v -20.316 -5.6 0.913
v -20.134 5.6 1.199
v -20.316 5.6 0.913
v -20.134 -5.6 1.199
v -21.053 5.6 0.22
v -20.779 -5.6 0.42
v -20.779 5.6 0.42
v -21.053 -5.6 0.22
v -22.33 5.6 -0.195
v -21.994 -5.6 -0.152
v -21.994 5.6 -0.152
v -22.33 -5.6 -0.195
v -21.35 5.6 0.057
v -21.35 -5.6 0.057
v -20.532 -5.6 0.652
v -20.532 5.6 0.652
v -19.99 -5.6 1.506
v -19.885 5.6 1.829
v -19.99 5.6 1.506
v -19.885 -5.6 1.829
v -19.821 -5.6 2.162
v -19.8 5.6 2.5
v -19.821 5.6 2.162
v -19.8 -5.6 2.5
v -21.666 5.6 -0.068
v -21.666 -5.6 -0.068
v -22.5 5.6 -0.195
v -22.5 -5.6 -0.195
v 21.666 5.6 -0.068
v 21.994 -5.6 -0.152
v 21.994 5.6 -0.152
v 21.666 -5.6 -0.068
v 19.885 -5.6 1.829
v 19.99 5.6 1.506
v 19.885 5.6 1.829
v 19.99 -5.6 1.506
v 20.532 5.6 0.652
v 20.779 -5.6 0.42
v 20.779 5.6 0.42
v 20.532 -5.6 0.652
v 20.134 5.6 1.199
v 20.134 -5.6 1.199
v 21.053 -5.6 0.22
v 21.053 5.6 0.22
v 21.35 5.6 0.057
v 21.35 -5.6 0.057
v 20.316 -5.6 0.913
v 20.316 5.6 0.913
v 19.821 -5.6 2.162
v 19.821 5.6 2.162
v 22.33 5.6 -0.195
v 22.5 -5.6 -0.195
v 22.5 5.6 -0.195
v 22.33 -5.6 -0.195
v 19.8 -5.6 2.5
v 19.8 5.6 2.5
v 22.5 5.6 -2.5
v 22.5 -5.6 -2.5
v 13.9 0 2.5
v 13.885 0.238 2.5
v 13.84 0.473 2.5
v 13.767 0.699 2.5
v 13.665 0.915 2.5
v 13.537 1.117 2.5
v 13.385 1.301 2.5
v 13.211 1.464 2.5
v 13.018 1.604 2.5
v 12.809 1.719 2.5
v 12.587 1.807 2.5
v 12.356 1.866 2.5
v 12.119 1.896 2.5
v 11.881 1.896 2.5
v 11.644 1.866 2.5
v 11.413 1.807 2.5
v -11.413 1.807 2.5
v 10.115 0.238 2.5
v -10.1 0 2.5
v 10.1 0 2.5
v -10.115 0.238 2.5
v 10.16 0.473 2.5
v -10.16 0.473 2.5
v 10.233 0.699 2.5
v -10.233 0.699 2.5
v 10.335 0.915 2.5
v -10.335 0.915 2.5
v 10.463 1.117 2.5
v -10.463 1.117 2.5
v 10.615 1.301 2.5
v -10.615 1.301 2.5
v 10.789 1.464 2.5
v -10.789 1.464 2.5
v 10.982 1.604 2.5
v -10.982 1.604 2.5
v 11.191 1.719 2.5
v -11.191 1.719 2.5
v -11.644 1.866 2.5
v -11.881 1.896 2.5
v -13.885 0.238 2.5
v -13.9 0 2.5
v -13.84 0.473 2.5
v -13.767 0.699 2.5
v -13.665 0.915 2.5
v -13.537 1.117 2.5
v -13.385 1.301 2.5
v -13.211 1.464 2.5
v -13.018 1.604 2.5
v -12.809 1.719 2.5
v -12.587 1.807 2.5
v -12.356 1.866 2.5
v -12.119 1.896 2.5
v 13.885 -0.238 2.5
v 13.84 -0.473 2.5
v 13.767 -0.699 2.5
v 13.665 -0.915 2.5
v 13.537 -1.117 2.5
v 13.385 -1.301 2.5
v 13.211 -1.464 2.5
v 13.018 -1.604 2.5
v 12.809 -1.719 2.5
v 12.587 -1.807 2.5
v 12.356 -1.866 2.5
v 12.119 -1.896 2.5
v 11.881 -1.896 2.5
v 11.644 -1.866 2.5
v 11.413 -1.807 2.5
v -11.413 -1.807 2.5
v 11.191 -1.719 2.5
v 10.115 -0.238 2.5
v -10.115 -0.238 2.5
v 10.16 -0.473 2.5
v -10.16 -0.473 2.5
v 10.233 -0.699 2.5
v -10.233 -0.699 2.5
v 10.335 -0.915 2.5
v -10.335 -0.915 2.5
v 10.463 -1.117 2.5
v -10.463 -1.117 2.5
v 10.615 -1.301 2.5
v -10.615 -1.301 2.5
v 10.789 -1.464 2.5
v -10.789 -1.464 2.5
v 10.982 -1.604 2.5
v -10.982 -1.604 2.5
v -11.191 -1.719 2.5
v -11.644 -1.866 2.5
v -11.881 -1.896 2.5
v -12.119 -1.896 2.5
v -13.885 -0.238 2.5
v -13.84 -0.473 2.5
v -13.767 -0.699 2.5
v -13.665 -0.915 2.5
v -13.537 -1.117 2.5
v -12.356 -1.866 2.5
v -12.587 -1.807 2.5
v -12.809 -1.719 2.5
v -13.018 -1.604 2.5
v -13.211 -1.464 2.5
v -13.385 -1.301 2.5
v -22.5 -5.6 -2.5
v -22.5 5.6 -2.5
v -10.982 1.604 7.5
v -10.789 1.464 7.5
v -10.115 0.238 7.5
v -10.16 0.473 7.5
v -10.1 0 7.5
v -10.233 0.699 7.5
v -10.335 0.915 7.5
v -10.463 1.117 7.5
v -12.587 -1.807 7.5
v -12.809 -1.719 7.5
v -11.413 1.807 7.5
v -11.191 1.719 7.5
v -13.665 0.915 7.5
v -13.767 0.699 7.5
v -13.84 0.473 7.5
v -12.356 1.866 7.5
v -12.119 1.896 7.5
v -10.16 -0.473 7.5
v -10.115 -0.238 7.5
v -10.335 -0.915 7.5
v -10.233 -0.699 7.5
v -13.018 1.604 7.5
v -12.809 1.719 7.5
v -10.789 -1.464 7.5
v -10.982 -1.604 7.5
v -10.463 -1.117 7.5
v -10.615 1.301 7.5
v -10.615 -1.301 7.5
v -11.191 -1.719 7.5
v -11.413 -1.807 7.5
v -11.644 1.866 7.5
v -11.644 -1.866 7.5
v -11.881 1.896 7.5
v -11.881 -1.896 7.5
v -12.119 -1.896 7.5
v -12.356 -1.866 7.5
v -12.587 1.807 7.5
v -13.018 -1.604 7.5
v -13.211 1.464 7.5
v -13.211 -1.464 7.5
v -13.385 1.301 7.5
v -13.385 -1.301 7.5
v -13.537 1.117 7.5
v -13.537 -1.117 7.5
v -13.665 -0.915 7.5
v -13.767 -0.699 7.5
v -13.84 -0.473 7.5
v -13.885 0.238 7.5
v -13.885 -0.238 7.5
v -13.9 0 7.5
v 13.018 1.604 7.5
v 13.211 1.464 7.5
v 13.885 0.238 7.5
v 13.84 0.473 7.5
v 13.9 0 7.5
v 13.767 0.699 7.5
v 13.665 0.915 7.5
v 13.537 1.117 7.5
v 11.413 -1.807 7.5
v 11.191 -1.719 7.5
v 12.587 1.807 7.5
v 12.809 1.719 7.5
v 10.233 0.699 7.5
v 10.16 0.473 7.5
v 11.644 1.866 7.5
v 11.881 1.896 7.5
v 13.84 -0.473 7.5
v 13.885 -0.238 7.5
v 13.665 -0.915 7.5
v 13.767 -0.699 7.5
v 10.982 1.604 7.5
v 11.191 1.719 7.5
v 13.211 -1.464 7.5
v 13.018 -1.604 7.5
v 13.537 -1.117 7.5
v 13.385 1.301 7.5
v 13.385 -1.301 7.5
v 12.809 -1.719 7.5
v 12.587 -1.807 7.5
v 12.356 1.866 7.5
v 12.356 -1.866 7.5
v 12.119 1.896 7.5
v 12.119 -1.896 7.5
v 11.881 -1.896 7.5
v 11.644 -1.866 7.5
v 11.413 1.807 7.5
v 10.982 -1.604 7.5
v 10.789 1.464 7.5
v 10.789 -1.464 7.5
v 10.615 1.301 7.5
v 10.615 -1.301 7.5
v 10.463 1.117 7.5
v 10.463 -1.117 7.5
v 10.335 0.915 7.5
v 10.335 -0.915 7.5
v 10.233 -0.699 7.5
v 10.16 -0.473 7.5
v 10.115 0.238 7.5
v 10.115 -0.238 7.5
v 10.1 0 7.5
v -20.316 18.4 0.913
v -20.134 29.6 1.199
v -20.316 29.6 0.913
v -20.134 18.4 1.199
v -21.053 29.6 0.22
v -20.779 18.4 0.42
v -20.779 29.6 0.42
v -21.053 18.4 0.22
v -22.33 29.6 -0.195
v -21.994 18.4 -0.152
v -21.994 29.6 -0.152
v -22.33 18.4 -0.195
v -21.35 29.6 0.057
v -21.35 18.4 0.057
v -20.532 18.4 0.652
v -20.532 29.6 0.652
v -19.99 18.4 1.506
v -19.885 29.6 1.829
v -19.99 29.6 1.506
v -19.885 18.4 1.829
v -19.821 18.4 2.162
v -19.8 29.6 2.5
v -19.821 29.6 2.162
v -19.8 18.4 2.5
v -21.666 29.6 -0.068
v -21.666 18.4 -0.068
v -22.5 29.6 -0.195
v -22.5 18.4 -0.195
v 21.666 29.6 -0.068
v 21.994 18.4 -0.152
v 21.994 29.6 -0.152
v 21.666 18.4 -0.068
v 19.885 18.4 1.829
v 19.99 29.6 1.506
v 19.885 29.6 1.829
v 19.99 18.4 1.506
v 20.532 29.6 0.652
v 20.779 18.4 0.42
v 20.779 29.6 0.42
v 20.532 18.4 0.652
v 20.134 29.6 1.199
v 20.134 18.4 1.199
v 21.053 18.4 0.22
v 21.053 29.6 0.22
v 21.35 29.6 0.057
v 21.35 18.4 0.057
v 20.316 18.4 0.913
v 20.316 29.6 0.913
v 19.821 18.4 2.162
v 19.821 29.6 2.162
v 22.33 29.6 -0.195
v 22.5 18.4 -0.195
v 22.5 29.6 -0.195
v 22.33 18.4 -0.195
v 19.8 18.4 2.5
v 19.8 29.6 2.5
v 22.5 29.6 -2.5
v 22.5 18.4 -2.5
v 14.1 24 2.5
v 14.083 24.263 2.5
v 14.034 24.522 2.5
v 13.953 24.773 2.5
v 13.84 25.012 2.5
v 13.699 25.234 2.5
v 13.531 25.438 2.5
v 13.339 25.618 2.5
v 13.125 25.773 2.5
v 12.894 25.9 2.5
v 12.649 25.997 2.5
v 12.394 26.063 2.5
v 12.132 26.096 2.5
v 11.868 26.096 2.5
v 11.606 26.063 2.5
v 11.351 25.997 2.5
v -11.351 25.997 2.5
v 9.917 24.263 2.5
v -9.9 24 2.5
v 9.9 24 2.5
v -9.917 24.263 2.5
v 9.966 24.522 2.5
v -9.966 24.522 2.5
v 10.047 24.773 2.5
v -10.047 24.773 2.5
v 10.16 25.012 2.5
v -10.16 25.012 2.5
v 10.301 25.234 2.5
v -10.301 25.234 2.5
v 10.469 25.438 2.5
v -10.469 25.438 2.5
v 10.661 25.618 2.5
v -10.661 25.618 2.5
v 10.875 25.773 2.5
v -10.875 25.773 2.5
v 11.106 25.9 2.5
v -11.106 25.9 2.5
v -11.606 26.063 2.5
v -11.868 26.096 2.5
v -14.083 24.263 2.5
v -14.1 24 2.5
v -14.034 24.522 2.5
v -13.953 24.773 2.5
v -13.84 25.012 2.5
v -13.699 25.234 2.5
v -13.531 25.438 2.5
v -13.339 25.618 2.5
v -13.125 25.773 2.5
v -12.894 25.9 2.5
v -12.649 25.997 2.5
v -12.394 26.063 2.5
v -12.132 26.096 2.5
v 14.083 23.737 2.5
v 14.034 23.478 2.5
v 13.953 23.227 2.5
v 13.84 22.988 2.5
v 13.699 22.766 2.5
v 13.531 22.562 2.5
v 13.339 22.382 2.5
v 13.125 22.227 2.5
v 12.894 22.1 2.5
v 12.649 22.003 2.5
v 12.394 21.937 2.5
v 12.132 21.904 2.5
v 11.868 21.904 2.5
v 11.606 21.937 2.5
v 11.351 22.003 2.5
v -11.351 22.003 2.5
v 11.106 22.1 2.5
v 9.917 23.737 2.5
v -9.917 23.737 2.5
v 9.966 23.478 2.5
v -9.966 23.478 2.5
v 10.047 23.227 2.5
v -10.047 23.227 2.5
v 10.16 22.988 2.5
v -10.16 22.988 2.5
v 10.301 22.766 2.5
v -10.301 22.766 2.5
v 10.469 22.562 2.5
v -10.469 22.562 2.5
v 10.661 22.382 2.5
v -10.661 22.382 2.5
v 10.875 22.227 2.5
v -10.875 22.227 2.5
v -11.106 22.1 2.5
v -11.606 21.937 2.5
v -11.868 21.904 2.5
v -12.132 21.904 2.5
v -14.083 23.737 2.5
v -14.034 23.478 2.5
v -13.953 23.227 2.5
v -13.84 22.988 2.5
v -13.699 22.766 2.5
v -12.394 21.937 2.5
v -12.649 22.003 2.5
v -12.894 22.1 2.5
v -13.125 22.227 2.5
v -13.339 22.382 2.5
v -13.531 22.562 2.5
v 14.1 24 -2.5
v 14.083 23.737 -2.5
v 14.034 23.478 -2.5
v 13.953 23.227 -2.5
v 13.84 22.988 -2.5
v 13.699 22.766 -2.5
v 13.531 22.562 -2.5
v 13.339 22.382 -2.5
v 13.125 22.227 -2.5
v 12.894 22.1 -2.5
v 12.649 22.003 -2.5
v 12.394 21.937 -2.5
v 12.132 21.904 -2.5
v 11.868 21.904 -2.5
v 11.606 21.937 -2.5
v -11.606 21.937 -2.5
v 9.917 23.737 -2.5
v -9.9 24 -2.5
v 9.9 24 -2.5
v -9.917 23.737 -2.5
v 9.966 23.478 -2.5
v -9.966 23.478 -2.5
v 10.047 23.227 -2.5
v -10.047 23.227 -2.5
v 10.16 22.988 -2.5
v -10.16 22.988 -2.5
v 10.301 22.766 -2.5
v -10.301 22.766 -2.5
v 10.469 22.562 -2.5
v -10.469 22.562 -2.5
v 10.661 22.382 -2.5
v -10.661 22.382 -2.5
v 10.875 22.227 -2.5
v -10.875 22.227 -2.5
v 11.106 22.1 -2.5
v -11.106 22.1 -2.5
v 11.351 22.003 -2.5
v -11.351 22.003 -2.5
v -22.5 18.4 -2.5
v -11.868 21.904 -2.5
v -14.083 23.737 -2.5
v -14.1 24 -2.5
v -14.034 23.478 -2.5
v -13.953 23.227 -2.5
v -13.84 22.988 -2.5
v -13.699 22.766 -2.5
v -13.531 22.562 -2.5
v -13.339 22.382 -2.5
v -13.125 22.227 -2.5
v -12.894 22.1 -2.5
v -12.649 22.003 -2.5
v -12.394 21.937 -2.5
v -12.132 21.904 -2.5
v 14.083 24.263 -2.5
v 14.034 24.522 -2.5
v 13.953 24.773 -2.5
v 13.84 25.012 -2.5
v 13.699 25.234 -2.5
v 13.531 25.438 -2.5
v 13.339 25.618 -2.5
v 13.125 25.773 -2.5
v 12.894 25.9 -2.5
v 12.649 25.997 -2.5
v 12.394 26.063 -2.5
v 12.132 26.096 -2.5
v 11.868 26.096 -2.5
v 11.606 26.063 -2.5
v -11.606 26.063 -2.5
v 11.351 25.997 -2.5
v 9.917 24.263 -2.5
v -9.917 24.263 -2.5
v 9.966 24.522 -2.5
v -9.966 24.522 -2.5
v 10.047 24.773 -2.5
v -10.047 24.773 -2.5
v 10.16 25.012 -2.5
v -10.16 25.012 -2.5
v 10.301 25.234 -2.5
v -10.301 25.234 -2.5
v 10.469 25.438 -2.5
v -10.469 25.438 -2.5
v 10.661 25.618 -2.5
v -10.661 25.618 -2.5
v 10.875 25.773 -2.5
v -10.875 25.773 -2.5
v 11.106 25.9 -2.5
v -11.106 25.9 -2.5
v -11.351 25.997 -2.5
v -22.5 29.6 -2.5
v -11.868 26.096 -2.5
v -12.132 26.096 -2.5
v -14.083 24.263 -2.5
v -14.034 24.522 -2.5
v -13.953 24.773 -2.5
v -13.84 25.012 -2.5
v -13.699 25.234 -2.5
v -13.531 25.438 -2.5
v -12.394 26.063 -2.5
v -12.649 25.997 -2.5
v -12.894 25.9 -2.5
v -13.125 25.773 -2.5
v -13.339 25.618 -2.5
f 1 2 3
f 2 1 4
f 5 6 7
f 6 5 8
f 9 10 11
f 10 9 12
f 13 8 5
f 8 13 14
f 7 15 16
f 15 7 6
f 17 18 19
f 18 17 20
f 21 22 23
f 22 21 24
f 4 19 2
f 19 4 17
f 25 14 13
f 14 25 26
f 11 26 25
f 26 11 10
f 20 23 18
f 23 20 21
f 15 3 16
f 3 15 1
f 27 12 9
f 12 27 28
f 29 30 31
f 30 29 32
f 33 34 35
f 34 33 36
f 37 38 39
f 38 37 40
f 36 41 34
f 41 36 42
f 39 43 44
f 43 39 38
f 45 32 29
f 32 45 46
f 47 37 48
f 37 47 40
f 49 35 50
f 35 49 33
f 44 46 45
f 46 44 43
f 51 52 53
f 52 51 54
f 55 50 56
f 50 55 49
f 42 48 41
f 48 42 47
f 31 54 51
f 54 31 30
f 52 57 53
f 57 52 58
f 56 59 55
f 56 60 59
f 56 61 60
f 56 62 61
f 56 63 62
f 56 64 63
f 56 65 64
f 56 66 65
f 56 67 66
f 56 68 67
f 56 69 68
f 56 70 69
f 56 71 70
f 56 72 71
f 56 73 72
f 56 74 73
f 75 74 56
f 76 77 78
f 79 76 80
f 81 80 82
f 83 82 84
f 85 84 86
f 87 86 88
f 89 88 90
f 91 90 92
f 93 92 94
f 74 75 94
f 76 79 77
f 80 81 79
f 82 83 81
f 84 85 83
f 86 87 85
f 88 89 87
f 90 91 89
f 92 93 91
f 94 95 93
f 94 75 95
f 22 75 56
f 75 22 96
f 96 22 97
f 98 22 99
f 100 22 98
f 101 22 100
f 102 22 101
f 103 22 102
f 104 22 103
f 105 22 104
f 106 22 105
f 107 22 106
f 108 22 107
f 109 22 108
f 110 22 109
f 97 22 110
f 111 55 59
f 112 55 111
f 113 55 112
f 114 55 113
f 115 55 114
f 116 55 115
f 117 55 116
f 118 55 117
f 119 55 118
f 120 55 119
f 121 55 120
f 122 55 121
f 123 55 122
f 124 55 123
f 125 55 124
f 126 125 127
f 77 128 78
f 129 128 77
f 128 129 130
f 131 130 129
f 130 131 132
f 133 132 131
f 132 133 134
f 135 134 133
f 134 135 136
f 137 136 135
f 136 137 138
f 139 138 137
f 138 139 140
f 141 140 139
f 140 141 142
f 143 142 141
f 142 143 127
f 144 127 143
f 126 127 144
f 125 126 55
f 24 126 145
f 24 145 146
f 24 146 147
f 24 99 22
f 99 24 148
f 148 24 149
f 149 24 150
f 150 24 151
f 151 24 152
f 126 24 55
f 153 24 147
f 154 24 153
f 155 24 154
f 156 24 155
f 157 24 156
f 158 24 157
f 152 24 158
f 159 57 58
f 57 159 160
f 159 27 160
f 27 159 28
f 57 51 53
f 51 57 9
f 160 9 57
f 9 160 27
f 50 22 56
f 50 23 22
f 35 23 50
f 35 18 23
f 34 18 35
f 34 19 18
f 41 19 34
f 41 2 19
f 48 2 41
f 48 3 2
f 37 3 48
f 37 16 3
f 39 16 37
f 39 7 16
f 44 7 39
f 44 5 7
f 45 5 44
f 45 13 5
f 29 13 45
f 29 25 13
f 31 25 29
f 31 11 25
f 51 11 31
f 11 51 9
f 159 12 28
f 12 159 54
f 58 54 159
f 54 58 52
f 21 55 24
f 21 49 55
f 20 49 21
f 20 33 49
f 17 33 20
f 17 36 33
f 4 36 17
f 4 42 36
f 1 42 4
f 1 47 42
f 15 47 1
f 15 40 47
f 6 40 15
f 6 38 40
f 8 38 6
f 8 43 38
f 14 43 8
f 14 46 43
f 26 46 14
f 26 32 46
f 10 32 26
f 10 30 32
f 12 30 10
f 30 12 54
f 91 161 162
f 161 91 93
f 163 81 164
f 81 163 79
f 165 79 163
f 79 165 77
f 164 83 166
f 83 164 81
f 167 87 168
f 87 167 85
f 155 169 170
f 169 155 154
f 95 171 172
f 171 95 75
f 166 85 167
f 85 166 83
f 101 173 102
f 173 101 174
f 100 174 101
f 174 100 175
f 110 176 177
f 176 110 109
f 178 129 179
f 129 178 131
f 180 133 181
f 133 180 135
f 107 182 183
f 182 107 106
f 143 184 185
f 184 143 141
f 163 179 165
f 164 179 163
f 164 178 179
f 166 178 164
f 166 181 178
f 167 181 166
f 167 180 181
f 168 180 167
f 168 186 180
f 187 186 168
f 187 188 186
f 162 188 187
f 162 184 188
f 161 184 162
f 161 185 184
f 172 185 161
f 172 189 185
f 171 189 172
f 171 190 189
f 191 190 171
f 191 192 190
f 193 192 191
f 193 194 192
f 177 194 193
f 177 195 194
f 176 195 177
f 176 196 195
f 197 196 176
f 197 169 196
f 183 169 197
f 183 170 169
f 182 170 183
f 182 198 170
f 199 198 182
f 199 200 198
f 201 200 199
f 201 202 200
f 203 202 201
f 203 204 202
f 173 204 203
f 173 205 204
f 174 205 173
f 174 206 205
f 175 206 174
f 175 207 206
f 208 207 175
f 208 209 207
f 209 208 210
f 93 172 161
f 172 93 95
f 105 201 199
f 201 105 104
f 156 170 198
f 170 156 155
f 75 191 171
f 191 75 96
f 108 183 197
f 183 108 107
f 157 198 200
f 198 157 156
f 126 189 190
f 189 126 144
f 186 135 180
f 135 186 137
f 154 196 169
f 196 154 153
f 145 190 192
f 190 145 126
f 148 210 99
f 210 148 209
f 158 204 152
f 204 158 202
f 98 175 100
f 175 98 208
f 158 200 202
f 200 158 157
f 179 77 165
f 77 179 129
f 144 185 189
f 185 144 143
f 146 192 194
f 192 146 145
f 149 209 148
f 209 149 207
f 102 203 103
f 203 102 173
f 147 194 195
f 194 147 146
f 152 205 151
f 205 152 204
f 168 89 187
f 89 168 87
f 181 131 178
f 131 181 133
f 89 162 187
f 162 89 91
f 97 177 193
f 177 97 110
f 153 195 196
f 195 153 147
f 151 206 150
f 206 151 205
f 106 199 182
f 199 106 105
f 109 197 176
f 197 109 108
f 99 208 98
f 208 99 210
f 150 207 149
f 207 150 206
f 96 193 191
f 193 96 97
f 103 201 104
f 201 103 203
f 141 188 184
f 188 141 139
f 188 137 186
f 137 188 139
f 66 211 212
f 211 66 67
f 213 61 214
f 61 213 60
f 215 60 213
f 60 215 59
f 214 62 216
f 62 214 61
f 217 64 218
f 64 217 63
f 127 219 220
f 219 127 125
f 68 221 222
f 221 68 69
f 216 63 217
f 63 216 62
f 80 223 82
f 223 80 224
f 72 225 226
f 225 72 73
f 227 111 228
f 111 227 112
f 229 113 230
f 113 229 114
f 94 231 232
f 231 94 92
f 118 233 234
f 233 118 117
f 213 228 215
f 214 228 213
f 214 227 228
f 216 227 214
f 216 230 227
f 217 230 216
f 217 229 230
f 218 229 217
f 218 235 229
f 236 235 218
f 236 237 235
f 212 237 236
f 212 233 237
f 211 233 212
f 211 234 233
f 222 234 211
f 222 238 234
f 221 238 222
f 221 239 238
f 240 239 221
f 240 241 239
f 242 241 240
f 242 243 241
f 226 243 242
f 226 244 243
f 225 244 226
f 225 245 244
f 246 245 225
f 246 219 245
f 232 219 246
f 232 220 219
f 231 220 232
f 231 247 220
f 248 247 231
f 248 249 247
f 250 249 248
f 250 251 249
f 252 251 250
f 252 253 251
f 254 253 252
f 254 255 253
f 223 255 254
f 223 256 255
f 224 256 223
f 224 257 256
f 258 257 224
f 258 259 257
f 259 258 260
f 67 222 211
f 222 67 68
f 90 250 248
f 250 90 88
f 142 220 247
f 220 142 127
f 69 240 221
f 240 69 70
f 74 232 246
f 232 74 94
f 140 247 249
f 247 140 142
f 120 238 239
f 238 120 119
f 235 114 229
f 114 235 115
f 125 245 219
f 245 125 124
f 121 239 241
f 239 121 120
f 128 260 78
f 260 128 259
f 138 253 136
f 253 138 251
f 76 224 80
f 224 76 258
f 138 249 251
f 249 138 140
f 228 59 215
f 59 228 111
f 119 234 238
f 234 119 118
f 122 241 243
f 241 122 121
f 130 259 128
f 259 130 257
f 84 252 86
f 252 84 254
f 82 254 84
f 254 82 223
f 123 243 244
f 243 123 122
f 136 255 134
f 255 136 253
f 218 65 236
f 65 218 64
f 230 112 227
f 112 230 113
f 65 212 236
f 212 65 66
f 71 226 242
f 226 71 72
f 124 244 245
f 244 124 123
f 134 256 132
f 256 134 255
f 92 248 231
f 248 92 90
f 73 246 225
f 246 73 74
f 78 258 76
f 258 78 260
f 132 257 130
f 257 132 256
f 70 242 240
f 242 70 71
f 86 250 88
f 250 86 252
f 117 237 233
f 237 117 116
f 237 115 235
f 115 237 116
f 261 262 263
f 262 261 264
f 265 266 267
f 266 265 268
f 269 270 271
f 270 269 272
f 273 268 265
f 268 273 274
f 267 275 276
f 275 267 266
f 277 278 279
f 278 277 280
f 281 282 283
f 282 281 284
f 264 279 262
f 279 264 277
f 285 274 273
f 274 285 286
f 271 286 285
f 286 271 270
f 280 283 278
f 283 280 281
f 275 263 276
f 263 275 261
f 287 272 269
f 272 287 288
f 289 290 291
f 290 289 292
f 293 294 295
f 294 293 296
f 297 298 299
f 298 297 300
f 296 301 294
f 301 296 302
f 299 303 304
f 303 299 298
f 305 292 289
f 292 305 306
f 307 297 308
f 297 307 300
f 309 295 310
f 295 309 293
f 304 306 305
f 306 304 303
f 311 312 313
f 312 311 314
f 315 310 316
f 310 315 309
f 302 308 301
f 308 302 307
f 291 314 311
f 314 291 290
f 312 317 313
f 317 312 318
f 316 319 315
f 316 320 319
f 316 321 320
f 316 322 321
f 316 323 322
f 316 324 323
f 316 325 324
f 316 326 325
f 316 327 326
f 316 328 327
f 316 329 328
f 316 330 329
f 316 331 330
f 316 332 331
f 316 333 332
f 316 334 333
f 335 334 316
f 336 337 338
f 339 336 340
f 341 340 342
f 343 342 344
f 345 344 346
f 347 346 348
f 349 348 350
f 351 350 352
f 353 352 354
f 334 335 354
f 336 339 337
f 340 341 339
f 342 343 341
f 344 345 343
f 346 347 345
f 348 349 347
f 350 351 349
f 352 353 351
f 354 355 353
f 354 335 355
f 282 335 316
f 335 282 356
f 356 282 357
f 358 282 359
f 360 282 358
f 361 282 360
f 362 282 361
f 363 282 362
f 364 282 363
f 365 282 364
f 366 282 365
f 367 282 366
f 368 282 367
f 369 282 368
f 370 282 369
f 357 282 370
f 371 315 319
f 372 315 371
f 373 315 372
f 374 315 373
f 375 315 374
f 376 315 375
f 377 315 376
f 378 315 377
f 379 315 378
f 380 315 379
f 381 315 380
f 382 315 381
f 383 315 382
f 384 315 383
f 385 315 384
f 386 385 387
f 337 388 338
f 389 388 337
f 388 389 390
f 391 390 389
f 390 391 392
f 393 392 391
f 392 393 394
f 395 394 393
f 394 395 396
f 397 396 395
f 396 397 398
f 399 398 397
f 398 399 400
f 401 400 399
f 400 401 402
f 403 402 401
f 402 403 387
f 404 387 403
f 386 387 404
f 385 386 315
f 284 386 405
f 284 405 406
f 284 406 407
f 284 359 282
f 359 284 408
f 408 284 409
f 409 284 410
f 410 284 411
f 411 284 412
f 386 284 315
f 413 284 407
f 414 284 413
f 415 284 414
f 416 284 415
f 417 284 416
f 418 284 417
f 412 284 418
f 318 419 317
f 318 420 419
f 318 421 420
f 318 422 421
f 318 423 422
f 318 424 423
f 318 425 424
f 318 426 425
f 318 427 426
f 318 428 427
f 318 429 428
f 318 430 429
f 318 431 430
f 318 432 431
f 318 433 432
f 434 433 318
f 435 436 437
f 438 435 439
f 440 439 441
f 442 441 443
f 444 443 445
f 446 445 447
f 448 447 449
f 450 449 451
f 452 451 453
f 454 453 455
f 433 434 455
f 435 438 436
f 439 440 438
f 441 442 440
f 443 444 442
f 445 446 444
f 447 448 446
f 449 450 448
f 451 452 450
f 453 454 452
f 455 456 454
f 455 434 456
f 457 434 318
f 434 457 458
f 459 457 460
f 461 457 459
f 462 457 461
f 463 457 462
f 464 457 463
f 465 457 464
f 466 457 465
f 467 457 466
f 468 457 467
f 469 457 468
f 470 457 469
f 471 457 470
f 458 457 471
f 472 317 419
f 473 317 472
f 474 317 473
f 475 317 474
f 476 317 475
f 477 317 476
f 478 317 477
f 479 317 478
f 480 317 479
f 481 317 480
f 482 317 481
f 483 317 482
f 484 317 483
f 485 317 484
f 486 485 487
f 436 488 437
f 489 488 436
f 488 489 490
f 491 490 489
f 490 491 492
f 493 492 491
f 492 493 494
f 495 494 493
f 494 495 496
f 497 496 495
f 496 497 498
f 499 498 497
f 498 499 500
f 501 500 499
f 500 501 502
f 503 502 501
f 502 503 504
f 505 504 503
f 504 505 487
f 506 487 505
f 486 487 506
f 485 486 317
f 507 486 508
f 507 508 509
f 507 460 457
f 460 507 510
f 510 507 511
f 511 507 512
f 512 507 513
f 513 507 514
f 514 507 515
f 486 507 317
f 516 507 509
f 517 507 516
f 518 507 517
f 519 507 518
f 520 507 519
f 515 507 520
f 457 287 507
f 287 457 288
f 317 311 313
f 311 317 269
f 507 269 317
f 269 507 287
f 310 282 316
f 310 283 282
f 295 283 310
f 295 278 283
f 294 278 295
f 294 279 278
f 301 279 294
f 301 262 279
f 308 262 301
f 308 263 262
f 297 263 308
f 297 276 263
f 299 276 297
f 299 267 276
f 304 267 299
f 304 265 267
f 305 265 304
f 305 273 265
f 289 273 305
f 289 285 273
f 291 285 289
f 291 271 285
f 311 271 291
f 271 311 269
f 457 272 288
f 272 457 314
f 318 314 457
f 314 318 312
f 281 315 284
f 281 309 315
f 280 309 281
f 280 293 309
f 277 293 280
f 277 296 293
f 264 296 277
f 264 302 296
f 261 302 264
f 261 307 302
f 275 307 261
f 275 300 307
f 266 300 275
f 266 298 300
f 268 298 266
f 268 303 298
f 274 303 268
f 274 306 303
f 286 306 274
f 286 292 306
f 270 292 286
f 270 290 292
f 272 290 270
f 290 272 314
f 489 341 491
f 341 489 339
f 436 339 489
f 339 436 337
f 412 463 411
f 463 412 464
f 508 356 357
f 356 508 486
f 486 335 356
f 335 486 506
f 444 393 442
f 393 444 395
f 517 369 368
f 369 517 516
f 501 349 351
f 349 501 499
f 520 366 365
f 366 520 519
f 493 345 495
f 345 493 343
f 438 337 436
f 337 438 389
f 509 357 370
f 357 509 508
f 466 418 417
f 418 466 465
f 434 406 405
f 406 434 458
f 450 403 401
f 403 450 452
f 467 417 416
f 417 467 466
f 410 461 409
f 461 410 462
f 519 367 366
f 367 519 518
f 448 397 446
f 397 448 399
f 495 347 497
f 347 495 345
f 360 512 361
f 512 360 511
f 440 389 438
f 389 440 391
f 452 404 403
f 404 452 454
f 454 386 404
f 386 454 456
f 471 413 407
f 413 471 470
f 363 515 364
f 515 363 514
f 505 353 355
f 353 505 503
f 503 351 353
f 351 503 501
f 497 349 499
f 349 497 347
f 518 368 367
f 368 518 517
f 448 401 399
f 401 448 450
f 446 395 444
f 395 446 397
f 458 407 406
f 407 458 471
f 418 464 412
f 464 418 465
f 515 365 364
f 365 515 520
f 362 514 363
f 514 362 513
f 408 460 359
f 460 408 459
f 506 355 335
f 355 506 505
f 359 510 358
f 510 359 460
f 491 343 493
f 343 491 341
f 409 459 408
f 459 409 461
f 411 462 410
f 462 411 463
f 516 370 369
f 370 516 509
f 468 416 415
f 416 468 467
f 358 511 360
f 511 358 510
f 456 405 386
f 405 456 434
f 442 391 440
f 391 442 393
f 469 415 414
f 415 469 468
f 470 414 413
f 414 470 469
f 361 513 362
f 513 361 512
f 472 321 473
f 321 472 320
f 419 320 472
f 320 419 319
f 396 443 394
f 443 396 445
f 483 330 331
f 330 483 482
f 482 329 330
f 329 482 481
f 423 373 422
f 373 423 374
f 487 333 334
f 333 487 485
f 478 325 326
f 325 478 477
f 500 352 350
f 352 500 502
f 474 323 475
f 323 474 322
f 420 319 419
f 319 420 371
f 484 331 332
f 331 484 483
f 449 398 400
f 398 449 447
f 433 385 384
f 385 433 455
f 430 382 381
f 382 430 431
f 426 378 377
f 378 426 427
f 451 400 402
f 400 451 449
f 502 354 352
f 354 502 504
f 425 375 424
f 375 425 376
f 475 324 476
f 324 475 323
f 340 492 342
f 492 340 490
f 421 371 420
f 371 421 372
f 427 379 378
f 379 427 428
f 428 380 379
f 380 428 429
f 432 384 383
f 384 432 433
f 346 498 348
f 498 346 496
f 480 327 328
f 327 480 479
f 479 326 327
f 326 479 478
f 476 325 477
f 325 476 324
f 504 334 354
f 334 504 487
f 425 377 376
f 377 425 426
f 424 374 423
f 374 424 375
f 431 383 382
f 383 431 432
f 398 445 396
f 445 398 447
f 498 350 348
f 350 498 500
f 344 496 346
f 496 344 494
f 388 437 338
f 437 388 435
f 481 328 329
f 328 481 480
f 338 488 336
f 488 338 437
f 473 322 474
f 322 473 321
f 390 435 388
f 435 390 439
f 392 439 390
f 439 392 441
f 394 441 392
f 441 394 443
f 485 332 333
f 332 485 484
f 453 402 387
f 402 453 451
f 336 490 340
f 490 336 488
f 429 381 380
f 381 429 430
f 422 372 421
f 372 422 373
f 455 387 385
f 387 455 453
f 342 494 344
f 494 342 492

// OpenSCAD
// This is a strap lock for the Tom Tailor Mesenger Bag "Kentucky".
// The part will prevent the shift of the buckle and the belt and ensure that
// both pieces will always stay in the same position.
//
// Designed by Timo Heinz aka Timothy McPrint
// Date: 2017-07-27
// This work is licensed under a Creative Commons Attribution-NonCommercial-ShareAlike 4.0 International License
// (https://creativecommons.org/licenses/by-nc-sa/4.0/)


$fn=50;

buckle_inner_width=40;
buckle_inner_height=12; //including the straps!
buckle_diameter=5;
buckle_tolerance=0.1; //tolerance of the plugs and the counter parts (will influence both parts) (you need to adjust this to your printer and printer settings!)
buckle_general_tolerance=0.2; //tolerance of the outer buckle
lock_diameter=4.0;


module CreateLock()
{
	difference()
	{
		cube([buckle_inner_width+1*buckle_diameter,
			  buckle_inner_height-4*buckle_general_tolerance,
			  buckle_diameter],
			  center=true);
		rotate([90,0,0]) //make the pins:
		{
			translate([-buckle_inner_width/2-buckle_diameter/2,buckle_diameter/2,0])
				cylinder(r=buckle_diameter/2+buckle_general_tolerance,
						 h=buckle_inner_height-buckle_general_tolerance+0.1,
						 center=true);
			translate([buckle_inner_width/2+buckle_diameter/2,buckle_diameter/2,0])
				cylinder(r=buckle_diameter/2+buckle_general_tolerance,
						 h=buckle_inner_height+0.1,
						 center=true);
		}
	}
}


//This will add two pins/plugs to the part for the male part of the fitting:
module MakeMale(radius)
{
	translate([-buckle_inner_width/2+2*lock_diameter,
	           0,
	           buckle_diameter]
	         )
		cylinder(r=radius,h=buckle_diameter,center=true);
	translate([buckle_inner_width/2-2*lock_diameter,
	           0,
	           buckle_diameter]
	         )
		cylinder(r=radius,h=buckle_diameter,center=true);
}


//The male parts will be copied and stretched in height (later a difference() will remove the parts and leave two holes):
module MakeFemale( radius )
{
	scale([1,1,3])
		translate([0,0,-buckle_diameter])
			MakeMale( radius );
}


//First make the male lock:
CreateLock();
MakeMale( lock_diameter/2 - buckle_tolerance );

//Now the female lock (as a variant of the male one):
translate([0,2*buckle_inner_height,0])
difference()
{
	CreateLock();
	MakeFemale( lock_diameter/2 + buckle_tolerance );
}
